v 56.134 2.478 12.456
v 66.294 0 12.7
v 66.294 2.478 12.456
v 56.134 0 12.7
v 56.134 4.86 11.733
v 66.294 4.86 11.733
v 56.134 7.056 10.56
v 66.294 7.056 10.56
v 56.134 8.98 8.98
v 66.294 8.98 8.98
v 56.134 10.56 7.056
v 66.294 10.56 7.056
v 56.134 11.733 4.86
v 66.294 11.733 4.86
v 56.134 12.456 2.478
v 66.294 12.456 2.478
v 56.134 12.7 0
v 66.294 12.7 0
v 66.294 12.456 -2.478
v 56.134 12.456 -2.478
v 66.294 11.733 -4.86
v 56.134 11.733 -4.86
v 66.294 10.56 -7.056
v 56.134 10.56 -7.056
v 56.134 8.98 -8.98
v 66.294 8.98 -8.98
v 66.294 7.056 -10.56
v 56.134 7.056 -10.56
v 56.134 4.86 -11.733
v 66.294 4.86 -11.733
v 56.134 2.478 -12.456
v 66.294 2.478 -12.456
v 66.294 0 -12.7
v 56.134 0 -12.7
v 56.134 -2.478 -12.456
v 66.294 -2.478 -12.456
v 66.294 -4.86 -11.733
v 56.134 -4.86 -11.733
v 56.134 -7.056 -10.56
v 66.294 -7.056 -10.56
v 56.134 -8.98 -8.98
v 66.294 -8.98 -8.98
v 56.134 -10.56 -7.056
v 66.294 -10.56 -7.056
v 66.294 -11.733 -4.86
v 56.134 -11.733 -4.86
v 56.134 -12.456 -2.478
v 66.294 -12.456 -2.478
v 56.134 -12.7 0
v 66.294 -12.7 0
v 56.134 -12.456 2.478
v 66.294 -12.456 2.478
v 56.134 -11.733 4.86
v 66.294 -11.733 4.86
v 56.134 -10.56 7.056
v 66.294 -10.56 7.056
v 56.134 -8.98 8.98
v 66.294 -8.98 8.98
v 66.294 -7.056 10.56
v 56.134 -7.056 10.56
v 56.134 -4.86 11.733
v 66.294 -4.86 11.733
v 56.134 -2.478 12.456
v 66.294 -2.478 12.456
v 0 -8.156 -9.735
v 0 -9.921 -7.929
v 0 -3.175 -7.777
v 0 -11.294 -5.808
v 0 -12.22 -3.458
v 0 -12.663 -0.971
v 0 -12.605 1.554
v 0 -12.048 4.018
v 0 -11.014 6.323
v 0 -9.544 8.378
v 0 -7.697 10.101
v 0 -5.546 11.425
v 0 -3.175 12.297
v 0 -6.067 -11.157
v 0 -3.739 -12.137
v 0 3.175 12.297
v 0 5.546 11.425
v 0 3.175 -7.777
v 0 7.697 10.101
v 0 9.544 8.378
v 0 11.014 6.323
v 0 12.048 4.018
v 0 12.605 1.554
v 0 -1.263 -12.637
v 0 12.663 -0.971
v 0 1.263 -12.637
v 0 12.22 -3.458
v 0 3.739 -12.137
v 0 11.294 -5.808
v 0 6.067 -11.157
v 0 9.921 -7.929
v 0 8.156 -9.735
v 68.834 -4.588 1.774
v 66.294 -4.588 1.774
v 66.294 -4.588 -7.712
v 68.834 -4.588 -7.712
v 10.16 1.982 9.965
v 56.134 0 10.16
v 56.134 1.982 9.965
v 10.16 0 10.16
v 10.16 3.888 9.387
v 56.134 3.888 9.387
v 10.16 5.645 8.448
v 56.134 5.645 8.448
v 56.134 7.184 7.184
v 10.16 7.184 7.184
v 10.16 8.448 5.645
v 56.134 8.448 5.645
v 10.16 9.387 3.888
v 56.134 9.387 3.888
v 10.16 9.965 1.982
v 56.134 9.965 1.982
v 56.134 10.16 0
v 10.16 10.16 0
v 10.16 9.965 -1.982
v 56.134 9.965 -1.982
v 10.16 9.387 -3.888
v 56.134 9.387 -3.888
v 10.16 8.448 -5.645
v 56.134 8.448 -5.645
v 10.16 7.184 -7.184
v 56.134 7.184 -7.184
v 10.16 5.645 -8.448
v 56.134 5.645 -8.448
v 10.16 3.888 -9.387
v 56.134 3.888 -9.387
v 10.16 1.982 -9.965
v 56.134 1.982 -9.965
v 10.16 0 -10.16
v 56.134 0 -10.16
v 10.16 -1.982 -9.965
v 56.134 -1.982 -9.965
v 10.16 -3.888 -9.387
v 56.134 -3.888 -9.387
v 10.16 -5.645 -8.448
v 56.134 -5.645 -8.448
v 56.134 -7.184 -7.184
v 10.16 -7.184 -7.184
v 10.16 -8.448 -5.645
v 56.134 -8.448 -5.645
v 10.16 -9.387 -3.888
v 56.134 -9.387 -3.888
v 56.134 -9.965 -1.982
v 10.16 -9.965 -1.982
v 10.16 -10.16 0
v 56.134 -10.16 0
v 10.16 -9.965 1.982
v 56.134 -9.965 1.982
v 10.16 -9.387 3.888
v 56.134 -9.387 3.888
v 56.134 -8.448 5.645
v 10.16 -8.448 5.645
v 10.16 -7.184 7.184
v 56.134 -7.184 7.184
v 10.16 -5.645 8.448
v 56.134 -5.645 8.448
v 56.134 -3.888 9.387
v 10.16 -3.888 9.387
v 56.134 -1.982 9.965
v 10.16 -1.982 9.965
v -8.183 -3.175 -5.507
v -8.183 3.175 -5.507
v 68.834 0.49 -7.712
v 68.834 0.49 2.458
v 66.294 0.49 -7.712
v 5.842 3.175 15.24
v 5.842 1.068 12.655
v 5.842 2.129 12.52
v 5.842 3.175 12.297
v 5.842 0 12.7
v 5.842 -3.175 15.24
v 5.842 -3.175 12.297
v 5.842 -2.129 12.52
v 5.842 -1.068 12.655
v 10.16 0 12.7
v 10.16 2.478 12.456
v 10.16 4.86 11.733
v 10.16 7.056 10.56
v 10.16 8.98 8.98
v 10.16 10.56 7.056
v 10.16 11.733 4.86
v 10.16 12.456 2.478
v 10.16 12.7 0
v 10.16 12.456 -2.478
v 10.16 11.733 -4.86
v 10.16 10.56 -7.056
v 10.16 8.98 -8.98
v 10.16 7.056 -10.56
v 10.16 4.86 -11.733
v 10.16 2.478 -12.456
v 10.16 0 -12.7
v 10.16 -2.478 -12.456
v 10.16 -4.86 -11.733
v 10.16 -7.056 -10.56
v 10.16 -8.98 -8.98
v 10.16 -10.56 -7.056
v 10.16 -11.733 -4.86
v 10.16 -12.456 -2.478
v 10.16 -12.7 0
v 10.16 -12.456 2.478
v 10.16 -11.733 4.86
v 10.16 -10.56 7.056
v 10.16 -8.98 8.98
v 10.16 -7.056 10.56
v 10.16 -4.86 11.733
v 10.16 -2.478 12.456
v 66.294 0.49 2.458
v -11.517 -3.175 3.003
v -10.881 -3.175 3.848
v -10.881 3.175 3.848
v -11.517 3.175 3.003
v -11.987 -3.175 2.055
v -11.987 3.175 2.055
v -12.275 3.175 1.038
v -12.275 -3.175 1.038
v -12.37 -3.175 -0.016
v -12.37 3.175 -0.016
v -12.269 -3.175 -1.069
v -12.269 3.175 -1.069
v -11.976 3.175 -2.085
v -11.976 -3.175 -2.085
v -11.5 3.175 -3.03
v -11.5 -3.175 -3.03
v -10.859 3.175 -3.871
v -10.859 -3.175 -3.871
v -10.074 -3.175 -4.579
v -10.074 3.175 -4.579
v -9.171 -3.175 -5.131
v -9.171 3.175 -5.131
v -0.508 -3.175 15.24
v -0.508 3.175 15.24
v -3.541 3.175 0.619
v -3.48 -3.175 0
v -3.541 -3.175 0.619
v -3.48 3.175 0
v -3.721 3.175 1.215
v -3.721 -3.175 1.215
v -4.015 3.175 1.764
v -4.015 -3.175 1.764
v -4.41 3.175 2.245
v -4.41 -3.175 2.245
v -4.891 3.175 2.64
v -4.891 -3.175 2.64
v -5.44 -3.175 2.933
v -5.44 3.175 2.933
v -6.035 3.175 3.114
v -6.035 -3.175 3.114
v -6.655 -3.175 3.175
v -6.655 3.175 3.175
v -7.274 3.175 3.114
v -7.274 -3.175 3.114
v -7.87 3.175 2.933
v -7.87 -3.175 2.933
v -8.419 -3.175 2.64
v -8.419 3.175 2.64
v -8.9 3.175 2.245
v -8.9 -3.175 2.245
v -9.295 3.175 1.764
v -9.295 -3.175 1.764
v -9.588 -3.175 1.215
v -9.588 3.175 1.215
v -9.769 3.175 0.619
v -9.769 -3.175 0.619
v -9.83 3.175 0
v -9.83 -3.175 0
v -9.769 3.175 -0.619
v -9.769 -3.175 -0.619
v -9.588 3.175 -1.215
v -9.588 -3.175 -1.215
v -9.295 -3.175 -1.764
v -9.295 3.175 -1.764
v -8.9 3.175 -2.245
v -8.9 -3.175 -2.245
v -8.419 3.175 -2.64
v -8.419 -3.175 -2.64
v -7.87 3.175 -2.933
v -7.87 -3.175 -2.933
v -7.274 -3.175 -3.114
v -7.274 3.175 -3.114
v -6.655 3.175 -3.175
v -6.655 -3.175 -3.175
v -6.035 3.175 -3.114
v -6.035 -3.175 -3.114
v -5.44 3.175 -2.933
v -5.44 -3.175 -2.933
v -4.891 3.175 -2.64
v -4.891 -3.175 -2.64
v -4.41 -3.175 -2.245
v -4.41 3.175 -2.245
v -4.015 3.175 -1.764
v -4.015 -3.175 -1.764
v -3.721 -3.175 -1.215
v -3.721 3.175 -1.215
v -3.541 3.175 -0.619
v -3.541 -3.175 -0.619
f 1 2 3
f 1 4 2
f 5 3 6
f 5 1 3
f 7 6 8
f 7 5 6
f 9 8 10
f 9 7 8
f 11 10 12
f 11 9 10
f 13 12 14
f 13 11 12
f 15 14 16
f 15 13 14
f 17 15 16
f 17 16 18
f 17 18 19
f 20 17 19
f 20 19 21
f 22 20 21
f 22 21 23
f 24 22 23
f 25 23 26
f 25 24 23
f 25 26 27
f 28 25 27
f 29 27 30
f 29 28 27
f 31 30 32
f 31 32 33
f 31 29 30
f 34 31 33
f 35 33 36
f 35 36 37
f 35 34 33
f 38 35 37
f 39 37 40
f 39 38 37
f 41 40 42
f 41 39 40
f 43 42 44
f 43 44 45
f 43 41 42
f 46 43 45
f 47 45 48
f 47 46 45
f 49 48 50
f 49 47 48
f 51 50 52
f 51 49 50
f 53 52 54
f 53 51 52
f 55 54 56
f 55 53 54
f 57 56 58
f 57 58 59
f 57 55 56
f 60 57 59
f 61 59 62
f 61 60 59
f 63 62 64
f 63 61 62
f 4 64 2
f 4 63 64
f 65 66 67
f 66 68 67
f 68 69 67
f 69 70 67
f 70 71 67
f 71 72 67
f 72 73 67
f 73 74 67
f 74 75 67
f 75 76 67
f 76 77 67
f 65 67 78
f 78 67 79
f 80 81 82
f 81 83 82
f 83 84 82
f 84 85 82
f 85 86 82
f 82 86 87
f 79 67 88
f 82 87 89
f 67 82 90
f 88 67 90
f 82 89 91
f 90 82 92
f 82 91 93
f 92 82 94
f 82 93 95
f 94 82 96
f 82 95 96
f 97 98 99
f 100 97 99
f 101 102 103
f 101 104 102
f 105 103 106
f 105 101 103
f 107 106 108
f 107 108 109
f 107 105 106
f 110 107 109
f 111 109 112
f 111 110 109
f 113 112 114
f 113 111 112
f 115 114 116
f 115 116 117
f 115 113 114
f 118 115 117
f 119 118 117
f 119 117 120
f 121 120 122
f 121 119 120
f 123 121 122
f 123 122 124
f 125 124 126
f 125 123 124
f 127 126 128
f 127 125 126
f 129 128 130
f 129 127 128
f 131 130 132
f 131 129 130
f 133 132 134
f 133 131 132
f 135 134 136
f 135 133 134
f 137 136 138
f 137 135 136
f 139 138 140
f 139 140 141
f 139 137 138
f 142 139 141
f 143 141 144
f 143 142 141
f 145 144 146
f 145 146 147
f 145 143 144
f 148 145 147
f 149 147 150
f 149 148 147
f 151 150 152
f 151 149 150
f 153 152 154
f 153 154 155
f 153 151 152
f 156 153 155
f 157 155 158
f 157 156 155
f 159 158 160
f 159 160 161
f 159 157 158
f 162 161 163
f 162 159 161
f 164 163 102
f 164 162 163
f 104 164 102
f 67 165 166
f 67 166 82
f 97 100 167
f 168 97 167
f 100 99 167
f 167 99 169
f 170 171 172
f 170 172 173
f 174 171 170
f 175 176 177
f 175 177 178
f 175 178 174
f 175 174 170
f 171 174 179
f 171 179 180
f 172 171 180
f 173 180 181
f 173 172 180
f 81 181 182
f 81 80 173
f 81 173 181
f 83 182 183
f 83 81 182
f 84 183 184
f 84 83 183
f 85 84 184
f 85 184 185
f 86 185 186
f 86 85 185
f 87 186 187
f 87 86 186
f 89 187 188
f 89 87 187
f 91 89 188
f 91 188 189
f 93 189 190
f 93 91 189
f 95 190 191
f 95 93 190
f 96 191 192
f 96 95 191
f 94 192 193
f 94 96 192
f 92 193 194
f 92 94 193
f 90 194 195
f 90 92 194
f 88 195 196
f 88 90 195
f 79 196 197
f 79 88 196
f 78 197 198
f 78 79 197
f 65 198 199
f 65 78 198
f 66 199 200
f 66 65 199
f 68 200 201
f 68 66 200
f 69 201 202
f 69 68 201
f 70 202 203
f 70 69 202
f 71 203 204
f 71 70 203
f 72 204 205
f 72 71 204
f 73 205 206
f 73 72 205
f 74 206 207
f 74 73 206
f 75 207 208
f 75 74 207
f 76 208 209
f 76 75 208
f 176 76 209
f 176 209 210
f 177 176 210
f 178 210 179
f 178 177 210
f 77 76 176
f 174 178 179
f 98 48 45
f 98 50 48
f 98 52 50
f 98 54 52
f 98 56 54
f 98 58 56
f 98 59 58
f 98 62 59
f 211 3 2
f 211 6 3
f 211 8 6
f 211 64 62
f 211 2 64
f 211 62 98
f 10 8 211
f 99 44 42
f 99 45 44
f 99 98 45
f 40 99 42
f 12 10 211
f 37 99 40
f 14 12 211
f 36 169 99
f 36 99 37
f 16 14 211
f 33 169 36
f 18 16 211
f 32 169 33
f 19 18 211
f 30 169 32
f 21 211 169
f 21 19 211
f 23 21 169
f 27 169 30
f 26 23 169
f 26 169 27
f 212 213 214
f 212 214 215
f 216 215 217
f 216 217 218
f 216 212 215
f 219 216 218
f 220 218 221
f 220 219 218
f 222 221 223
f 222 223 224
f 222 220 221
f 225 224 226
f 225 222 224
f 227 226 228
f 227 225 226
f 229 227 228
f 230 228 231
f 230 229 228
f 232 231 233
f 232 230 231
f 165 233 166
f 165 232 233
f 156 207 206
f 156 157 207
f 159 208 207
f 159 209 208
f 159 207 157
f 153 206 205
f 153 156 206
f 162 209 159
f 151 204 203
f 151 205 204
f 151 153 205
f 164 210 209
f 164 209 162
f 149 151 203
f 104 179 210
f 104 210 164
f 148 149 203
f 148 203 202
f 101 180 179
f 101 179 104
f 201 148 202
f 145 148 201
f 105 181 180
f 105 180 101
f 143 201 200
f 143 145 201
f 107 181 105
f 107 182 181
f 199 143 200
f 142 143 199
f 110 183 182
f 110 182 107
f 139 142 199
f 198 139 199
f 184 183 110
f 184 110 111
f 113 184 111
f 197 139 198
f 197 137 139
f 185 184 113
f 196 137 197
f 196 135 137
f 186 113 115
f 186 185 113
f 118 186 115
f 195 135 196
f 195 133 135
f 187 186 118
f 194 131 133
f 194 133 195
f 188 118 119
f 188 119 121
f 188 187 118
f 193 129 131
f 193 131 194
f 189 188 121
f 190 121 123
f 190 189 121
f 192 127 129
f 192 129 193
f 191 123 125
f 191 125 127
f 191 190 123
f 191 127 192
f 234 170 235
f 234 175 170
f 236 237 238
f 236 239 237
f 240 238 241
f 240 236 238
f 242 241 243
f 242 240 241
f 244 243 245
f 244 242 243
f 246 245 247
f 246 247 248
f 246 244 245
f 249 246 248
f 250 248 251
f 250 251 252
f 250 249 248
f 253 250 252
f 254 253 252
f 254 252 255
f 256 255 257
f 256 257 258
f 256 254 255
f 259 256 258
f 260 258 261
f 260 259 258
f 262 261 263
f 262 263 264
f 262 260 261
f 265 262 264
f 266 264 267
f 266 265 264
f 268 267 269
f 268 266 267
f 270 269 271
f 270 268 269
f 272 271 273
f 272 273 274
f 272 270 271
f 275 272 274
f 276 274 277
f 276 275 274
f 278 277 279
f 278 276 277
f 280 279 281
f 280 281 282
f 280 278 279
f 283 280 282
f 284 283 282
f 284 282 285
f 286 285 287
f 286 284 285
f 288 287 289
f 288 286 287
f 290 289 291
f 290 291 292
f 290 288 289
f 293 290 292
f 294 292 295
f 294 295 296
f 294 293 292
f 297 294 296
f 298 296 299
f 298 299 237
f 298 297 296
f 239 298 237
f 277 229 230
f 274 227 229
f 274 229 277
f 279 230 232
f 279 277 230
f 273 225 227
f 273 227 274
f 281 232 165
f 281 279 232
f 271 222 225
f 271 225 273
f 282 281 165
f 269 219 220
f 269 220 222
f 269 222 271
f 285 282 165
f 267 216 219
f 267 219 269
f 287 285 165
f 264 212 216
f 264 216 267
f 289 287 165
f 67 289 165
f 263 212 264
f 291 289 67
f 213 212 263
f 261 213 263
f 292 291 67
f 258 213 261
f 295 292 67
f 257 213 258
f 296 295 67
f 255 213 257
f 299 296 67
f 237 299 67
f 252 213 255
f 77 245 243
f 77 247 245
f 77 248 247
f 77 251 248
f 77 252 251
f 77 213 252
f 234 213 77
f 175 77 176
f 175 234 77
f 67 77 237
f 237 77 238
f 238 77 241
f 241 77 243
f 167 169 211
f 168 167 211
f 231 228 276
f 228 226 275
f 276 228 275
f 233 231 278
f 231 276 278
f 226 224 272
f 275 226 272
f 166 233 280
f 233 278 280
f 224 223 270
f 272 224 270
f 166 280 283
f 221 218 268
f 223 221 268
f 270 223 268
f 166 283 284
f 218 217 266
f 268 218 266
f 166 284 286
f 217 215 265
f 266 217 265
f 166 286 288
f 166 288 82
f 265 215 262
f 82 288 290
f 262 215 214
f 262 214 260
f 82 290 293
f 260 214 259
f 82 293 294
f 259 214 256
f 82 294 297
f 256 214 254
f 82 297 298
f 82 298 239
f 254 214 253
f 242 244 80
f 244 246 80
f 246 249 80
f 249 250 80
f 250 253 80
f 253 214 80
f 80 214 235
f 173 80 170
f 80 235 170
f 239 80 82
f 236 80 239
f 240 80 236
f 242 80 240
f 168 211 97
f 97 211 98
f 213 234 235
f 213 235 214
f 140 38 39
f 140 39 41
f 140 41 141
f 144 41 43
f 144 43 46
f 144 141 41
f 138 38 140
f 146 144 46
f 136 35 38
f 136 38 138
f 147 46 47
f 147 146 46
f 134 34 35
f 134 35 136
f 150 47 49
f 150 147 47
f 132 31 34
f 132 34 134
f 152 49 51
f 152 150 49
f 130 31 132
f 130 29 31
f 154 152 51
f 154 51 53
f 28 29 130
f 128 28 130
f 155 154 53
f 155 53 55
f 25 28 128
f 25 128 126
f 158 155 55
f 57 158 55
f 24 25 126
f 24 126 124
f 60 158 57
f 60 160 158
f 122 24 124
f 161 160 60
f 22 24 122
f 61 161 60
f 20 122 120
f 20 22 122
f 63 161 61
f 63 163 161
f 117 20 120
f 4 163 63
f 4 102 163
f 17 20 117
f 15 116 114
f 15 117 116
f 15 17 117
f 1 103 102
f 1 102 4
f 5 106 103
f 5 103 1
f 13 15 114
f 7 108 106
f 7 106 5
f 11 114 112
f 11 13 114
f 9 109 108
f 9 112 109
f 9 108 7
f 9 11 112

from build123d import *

# Parameters (mm, degrees)
F0_R     = 3.175
F0_W     = 5.842
F0_H     = 12.7
F1_DEPTH = 3.175
F4_DEPTH = 2.54


with BuildPart() as f1:
    # F0 (on Front) → F1 (new body, symmetric)
    with BuildSketch(Plane.XZ):
        with BuildLine():
            Line((-0.9398, 0), (0, 0))
            Line((0, 0), (0, 12.7))
            Line((0, 12.7), (5.842, 12.7))
            Line((5.842, 12.7), (5.842, 15.24))
            Line((5.842, 15.24), (-0.508, 15.24))
            Line((-0.508, 15.24), (-10.88063, 3.847543))
            ThreePointArc((-10.88063, 3.847543), (-4.591961, 5.329721), (-0.9398, 0))
        make_face()
        with BuildLine():
            ThreePointArc((-8.182663, -5.506983), (-3.195791, -4.549339), (-0.9398, 0))
            ThreePointArc((-0.9398, 0), (-4.591961, 5.329721), (-10.88063, 3.847543))
            ThreePointArc((-10.88063, 3.847543), (-12.145978, -1.583727), (-8.182663, -5.506983))
        make_face()
        with Locations((-6.6548, 0)):
            Circle(F0_R, mode=Mode.SUBTRACT)
        with BuildLine():
            Line((0, -7.777189), (0, 0))
            Line((0, 0), (-0.9398, 0))
            ThreePointArc((-0.9398, 0), (-3.195791, -4.549339), (-8.182663, -5.506983))
            Line((-8.182663, -5.506983), (0, -7.777189))
        make_face()
        Polygon((5.842, 0), (0, 0), (0, -7.777189), (5.842, -9.398), align=None)
        with Locations((2.921, 6.35)):
            Rectangle(F0_W, F0_H)
    extrude(amount=F1_DEPTH, both=True)

    # F0 (on Front) → F2 (revolve)
    with BuildSketch(Plane.XZ):
        Polygon((5.842, 12.7), (5.842, 0), (66.294, 0), (66.294, 12.7), (56.134, 12.7), (56.134, 10.16), (10.16, 10.16), (10.16, 12.7), align=None)
        with Locations((2.921, 6.35)):
            Rectangle(F0_W, F0_H)
    revolve(axis=Axis((33.147, 0, 0), (-1, 0, 0)))

    # F3 (on face) → F4 (join)
    with BuildSketch(Plane.YZ.offset(66.294)):
        Polygon((0.490244, 2.458155), (-4.588165, 1.773549), (-4.588165, -7.711818), (0.490244, -7.711818), align=None)
    extrude(amount=F4_DEPTH)


solid = f1.part
